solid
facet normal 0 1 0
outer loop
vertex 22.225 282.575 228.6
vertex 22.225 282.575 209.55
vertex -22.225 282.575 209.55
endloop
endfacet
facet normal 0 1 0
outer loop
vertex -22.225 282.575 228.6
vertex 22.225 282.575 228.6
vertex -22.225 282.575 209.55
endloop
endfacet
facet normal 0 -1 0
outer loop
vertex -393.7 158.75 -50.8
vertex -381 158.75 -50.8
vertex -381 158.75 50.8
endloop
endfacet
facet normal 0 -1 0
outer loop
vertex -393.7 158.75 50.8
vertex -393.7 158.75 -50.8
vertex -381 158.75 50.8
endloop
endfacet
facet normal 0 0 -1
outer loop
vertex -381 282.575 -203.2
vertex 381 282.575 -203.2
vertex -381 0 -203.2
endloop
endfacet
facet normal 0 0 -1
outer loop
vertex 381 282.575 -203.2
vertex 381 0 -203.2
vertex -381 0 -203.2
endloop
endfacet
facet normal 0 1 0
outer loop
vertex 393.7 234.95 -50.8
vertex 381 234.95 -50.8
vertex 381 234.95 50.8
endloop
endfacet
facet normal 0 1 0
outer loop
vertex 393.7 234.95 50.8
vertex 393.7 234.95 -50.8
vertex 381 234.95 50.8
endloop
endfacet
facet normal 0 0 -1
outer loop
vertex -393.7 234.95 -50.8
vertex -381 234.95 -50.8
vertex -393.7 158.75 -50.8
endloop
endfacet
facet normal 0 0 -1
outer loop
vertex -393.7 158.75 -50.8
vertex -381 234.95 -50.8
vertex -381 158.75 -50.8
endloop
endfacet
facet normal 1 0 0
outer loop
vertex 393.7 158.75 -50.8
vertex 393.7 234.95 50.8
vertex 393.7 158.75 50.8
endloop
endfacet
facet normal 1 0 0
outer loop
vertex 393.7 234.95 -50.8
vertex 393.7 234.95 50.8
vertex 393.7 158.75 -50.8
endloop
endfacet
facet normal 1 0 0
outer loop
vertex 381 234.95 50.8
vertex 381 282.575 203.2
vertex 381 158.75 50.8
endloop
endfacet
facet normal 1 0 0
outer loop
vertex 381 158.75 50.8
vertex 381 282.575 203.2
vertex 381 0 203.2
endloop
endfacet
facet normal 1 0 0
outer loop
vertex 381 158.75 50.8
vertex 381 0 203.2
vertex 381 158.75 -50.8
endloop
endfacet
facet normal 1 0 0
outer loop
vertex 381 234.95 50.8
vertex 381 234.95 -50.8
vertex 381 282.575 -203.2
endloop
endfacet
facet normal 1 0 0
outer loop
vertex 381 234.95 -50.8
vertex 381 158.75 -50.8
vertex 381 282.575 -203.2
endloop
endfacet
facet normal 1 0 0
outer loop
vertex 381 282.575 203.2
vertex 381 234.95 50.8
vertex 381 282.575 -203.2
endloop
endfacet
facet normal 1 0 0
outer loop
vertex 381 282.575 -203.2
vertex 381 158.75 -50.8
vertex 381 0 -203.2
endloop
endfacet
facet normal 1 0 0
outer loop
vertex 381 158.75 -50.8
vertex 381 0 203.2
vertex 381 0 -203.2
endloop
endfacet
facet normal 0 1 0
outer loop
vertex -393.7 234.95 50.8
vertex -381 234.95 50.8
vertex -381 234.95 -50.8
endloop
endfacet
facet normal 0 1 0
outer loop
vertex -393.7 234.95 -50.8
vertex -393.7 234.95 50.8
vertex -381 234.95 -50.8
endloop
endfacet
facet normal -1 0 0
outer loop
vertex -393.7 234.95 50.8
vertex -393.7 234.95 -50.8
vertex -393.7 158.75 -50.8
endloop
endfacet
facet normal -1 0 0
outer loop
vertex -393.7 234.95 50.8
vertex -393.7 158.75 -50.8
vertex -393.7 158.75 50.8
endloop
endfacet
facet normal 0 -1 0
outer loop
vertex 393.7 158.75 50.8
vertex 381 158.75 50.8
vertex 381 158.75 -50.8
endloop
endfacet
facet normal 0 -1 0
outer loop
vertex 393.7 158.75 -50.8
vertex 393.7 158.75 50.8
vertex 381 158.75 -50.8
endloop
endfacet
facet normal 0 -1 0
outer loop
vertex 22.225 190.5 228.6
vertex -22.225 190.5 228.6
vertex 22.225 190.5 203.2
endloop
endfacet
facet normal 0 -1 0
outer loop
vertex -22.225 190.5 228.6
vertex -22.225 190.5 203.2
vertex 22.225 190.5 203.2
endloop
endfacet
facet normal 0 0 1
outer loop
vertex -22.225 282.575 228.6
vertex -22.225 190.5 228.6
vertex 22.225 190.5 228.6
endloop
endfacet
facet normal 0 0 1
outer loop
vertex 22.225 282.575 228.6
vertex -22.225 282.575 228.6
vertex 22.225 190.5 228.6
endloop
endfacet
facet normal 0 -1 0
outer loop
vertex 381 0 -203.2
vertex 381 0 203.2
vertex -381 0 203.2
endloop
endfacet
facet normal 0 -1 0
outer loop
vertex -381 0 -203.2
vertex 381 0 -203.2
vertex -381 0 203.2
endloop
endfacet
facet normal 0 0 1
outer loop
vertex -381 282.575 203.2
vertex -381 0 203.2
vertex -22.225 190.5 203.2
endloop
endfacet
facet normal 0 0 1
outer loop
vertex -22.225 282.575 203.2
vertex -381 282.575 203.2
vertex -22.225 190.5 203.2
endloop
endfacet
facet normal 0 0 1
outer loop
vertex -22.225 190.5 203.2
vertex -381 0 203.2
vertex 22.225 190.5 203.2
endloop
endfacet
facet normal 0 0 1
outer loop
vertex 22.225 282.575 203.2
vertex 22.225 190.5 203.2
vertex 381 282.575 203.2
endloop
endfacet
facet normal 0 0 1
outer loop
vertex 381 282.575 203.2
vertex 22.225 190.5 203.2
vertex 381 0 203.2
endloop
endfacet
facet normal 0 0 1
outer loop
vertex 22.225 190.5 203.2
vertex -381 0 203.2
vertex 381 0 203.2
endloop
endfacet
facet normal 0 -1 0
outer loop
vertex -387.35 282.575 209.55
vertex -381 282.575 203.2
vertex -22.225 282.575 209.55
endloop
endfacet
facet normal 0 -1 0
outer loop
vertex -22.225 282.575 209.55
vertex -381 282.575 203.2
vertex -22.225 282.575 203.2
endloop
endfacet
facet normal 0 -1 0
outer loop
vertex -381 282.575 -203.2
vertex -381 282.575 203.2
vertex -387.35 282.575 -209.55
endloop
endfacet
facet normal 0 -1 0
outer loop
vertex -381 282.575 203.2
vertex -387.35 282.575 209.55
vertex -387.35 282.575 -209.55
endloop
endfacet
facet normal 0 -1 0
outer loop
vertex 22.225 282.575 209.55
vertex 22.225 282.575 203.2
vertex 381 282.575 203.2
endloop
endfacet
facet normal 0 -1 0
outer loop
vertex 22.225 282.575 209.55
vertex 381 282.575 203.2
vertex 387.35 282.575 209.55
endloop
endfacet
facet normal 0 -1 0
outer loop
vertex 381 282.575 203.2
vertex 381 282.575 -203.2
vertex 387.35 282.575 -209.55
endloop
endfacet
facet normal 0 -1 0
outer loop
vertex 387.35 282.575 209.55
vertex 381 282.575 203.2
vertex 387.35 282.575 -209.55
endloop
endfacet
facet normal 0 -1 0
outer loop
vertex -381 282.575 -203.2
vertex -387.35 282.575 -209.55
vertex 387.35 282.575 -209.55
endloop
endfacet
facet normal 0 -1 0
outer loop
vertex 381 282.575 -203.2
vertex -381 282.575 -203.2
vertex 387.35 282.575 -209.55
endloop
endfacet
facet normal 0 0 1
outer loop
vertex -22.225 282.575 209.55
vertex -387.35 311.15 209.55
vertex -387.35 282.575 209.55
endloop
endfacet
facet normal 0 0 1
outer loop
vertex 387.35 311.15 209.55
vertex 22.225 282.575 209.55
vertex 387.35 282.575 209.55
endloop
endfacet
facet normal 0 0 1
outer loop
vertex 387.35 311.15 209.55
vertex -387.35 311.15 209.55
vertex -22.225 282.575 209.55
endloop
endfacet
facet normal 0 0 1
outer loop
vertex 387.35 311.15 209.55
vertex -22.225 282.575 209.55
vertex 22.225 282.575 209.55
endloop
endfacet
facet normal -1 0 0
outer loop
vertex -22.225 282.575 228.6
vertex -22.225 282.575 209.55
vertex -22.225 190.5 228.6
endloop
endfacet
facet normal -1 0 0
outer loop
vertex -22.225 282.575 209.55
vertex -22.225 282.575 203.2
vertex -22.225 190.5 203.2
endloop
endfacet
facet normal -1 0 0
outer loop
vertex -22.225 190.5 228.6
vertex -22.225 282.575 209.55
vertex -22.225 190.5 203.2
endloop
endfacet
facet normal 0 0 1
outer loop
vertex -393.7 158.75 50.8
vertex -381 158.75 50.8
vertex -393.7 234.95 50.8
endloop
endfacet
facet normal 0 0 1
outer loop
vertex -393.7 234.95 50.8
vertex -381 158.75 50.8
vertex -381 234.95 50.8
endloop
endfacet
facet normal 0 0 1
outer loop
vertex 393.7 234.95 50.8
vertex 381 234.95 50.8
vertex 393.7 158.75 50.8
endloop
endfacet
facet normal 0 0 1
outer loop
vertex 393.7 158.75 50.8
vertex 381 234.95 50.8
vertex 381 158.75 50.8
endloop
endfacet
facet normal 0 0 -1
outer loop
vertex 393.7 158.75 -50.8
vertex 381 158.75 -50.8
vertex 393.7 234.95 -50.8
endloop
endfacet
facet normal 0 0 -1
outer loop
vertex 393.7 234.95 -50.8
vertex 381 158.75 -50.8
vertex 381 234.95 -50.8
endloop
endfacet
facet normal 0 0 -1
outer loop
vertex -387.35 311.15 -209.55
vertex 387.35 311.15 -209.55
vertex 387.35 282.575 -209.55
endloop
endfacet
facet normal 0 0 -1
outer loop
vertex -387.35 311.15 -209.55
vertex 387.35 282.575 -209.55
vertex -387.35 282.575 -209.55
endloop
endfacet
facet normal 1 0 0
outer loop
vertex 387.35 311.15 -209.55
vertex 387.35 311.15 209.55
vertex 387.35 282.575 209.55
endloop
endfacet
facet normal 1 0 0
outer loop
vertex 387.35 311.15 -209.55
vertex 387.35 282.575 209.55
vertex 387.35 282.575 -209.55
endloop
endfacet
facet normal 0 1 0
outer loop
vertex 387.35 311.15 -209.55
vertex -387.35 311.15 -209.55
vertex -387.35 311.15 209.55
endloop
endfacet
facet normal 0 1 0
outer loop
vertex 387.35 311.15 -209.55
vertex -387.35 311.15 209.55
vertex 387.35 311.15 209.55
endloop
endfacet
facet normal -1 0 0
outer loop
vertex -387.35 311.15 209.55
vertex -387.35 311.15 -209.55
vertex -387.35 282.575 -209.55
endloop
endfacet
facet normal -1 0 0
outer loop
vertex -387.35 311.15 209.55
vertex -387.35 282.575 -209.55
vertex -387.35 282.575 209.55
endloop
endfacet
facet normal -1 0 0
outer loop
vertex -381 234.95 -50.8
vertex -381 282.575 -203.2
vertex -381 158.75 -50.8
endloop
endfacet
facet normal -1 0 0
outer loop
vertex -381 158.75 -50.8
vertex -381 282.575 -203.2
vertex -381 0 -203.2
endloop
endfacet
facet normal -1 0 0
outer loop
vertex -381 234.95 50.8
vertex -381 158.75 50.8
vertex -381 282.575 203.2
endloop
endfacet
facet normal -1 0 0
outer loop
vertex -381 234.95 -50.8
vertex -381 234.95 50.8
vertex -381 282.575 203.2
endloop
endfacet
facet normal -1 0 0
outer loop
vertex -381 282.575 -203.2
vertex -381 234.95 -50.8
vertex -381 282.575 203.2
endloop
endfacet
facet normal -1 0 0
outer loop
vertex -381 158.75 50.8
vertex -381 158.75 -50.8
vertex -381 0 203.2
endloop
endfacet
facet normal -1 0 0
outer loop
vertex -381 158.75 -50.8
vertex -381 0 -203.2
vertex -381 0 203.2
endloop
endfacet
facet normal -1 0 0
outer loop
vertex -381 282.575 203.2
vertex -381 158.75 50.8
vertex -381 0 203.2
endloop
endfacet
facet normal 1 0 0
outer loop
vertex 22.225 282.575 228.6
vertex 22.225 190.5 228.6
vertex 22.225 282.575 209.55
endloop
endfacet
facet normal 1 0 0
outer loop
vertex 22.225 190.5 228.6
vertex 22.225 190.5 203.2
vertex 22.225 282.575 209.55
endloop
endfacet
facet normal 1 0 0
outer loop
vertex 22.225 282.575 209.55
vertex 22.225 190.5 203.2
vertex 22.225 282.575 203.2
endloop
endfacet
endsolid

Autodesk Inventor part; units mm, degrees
ref_plane "YZ Plane" through (0, 0, 0) normal (1, 0, 0) x (0, 1, 0)
ref_plane "XZ Plane" through (0, 0, 0) normal (0, 1, 0) x (-1, 0, 0)
ref_plane "XY Plane" through (0, 0, 0) normal (0, 0, 1) x (1, 0, 0)
sketch "Sketch1" plane through (0, 0, 0) normal (0, 1, 0) x (-1, 0, 0)
  line L0 (381, 203.2) -> (-381, 203.2)
  line L1 (-381, 203.2) -> (-381, -203.2)
  line L2 (-381, -203.2) -> (381, -203.2)
  line L3 (381, -203.2) -> (381, 203.2)
  line L4 (381, 203.2) -> (-381, -203.2) construction
  line L5 (-381, 203.2) -> (381, -203.2) construction
  point P0 (0, 0)
  dimension "d0" = 762
  dimension "d1" = 406.4
extrude "Extrusion1" add sketch "Sketch1" along normal blind 311.15
sketch "Sketch2" plane through (0, 311.15, 0) normal (0, 1, 0) x (1, 0, 0)
  line L0 (-387.35, -209.55) -> (387.35, -209.55)
  line L1 (387.35, -209.55) -> (387.35, 209.55)
  line L2 (387.35, 209.55) -> (-387.35, 209.55)
  line L3 (-387.35, 209.55) -> (-387.35, -209.55)
  line L4 (-387.35, -209.55) -> (387.35, 209.55) construction
  line L5 (387.35, -209.55) -> (-387.35, 209.55) construction
  point P0 (-381, -203.2)
  point P1 (381, -203.2)
  point P2 (0, 0)
  dimension "d20" = 774.7
  dimension "d21" = 419.1
extrude "Extrusion2" add sketch "Sketch2" against normal blind 28.575
sketch "Sketch3" plane through (-381, 0, 203.2) normal (0, 0, 1) x (1, 0, 0)
  line L0 (358.775, 190.5) -> (403.225, 190.5)
  line L1 (403.225, 190.5) -> (403.225, 282.575)
  line L2 (403.225, 282.575) -> (358.775, 282.575)
  line L3 (358.775, 282.575) -> (358.775, 190.5)
  line L4 (762, 282.575) -> (0, 282.575) construction
  point P0 (381, 0)
  point P1 (381, 190.5)
  dimension "d7" = 44.45
  dimension "d8" = 190.5
extrude "Extrusion3" add sketch "Sketch3" along normal blind 25.4
sketch "Sketch4" plane through (381, 0, 203.2) normal (1, 0, 0) x (0, 0, -1)
  line L0 (152.4, 158.75) -> (254, 158.75)
  line L1 (254, 158.75) -> (254, 234.95)
  line L2 (254, 234.95) -> (152.4, 234.95)
  line L3 (152.4, 234.95) -> (152.4, 158.75)
  point P0 (203.2, 0)
  point P1 (203.2, 158.75)
  dimension "d11" = 101.6
  dimension "d12" = 158.75
  dimension "d13" = 76.2
extrude "Extrusion4" add sketch "Sketch4" along normal blind 12.7
mirror "Mirror1" about plane through (0, 0, 0) normal (1, 0, 0) of "Extrusion4"
properties part number "Jobox tool box" material "Copper"
